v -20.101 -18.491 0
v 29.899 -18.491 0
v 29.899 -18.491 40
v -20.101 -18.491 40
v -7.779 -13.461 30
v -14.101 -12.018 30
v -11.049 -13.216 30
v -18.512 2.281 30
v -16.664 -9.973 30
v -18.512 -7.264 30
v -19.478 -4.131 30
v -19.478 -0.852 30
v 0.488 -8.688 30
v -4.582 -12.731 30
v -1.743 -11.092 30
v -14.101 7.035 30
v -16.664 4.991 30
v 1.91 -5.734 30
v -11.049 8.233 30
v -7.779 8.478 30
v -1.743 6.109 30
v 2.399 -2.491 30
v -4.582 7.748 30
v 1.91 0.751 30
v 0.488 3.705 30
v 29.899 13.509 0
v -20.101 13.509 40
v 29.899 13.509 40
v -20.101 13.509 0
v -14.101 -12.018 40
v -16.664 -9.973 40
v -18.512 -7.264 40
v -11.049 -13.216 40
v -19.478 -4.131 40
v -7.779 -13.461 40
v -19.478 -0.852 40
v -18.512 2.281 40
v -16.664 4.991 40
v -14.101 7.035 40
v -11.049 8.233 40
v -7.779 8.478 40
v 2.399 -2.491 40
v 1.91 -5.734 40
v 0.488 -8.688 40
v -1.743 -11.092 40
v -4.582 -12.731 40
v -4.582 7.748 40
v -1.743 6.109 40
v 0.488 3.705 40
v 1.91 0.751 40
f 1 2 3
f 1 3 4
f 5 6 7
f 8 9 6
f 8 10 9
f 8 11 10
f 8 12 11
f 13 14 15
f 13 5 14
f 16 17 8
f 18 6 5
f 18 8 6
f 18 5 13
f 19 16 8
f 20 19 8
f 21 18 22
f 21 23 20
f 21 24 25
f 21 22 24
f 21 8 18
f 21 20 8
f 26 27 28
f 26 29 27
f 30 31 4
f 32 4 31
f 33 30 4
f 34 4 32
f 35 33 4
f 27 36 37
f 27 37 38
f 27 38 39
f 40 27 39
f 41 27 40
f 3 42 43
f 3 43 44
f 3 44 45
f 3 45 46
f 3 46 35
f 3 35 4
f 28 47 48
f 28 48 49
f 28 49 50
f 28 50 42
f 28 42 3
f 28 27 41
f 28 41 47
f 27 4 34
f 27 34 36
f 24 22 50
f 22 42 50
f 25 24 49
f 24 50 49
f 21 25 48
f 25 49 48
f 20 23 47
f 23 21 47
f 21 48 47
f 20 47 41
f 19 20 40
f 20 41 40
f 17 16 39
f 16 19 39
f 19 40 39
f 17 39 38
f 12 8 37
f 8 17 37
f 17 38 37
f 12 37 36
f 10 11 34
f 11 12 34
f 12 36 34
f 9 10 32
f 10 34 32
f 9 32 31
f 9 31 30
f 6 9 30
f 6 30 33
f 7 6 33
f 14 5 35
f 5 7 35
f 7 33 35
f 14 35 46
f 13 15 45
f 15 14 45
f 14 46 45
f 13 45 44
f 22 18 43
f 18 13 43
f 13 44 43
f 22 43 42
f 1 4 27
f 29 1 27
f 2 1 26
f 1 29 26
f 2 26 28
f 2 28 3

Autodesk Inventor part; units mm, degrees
ref_plane "YZ Plane" through (0, 0, 0) normal (1, 0, 0) x (0, 1, 0)
ref_plane "XZ Plane" through (0, 0, 0) normal (0, 1, 0) x (-1, 0, 0)
ref_plane "XY Plane" through (0, 0, 0) normal (0, 0, 1) x (1, 0, 0)
sketch "Sketch1" plane through (0, 0, 0) normal (0, 0, 1) x (1, 0, 0)
  line L0 (-20.1009, 13.5086) -> (29.8991, 13.5086)
  line L1 (29.8991, 13.5086) -> (29.8991, -18.4914)
  line L2 (29.8991, -18.4914) -> (-20.1009, -18.4914)
  line L3 (-20.1009, -18.4914) -> (-20.1009, 13.5086)
  point P0 (0, 0)
  dimension "d0" = 50
  dimension "d1" = 32
extrude "Extrusion1" add sketch "Sketch1" along normal blind 40
sketch "Sketch2" plane through (0, 0, 40) normal (0, 0, 1) x (1, 0, 0)
  line L0 (-20.1009, -18.4914) -> (-20.1009, 13.5086) projected
  line L1 (29.8991, -18.4914) -> (-20.1009, -18.4914) projected
  line L2 (-20.1009, -2.4914) -> (-8.6009, -2.4914)
  circle A0 centre (-8.6009, -2.4914) radius 8
  point P0 (0, 0)
  dimension "d4" = 11.5
  dimension "d5" = 16
extrude "Extrusion2" cut sketch "Sketch2" against normal blind 10
sketch "Sketch3" plane through (0, 0, 40) normal (0, 0, 1) x (1, 0, 0)
  circle A0 centre (-8.6009, -2.4914) radius 8 projected
  point P0 (0, 0)
extrude "Extrusion3" add sketch "Sketch3" against normal blind 10
sketch "Sketch4" plane through (0, 0, 40) normal (0, 0, 1) x (1, 0, 0)
  line L0 (-20.1009, -18.4914) -> (-20.1009, 13.5086) projected
  line L1 (29.8991, -18.4914) -> (-20.1009, -18.4914) projected
  line L2 (-20.1009, -2.4914) -> (-8.6009, -2.4914)
  circle A0 centre (-8.6009, -2.4914) radius 11
  point P0 (0, 0)
  dimension "d10" = 11.5
  dimension "d11" = 22
extrude "Extrusion4" cut sketch "Sketch4" against normal blind 10
properties part number "basic1"
